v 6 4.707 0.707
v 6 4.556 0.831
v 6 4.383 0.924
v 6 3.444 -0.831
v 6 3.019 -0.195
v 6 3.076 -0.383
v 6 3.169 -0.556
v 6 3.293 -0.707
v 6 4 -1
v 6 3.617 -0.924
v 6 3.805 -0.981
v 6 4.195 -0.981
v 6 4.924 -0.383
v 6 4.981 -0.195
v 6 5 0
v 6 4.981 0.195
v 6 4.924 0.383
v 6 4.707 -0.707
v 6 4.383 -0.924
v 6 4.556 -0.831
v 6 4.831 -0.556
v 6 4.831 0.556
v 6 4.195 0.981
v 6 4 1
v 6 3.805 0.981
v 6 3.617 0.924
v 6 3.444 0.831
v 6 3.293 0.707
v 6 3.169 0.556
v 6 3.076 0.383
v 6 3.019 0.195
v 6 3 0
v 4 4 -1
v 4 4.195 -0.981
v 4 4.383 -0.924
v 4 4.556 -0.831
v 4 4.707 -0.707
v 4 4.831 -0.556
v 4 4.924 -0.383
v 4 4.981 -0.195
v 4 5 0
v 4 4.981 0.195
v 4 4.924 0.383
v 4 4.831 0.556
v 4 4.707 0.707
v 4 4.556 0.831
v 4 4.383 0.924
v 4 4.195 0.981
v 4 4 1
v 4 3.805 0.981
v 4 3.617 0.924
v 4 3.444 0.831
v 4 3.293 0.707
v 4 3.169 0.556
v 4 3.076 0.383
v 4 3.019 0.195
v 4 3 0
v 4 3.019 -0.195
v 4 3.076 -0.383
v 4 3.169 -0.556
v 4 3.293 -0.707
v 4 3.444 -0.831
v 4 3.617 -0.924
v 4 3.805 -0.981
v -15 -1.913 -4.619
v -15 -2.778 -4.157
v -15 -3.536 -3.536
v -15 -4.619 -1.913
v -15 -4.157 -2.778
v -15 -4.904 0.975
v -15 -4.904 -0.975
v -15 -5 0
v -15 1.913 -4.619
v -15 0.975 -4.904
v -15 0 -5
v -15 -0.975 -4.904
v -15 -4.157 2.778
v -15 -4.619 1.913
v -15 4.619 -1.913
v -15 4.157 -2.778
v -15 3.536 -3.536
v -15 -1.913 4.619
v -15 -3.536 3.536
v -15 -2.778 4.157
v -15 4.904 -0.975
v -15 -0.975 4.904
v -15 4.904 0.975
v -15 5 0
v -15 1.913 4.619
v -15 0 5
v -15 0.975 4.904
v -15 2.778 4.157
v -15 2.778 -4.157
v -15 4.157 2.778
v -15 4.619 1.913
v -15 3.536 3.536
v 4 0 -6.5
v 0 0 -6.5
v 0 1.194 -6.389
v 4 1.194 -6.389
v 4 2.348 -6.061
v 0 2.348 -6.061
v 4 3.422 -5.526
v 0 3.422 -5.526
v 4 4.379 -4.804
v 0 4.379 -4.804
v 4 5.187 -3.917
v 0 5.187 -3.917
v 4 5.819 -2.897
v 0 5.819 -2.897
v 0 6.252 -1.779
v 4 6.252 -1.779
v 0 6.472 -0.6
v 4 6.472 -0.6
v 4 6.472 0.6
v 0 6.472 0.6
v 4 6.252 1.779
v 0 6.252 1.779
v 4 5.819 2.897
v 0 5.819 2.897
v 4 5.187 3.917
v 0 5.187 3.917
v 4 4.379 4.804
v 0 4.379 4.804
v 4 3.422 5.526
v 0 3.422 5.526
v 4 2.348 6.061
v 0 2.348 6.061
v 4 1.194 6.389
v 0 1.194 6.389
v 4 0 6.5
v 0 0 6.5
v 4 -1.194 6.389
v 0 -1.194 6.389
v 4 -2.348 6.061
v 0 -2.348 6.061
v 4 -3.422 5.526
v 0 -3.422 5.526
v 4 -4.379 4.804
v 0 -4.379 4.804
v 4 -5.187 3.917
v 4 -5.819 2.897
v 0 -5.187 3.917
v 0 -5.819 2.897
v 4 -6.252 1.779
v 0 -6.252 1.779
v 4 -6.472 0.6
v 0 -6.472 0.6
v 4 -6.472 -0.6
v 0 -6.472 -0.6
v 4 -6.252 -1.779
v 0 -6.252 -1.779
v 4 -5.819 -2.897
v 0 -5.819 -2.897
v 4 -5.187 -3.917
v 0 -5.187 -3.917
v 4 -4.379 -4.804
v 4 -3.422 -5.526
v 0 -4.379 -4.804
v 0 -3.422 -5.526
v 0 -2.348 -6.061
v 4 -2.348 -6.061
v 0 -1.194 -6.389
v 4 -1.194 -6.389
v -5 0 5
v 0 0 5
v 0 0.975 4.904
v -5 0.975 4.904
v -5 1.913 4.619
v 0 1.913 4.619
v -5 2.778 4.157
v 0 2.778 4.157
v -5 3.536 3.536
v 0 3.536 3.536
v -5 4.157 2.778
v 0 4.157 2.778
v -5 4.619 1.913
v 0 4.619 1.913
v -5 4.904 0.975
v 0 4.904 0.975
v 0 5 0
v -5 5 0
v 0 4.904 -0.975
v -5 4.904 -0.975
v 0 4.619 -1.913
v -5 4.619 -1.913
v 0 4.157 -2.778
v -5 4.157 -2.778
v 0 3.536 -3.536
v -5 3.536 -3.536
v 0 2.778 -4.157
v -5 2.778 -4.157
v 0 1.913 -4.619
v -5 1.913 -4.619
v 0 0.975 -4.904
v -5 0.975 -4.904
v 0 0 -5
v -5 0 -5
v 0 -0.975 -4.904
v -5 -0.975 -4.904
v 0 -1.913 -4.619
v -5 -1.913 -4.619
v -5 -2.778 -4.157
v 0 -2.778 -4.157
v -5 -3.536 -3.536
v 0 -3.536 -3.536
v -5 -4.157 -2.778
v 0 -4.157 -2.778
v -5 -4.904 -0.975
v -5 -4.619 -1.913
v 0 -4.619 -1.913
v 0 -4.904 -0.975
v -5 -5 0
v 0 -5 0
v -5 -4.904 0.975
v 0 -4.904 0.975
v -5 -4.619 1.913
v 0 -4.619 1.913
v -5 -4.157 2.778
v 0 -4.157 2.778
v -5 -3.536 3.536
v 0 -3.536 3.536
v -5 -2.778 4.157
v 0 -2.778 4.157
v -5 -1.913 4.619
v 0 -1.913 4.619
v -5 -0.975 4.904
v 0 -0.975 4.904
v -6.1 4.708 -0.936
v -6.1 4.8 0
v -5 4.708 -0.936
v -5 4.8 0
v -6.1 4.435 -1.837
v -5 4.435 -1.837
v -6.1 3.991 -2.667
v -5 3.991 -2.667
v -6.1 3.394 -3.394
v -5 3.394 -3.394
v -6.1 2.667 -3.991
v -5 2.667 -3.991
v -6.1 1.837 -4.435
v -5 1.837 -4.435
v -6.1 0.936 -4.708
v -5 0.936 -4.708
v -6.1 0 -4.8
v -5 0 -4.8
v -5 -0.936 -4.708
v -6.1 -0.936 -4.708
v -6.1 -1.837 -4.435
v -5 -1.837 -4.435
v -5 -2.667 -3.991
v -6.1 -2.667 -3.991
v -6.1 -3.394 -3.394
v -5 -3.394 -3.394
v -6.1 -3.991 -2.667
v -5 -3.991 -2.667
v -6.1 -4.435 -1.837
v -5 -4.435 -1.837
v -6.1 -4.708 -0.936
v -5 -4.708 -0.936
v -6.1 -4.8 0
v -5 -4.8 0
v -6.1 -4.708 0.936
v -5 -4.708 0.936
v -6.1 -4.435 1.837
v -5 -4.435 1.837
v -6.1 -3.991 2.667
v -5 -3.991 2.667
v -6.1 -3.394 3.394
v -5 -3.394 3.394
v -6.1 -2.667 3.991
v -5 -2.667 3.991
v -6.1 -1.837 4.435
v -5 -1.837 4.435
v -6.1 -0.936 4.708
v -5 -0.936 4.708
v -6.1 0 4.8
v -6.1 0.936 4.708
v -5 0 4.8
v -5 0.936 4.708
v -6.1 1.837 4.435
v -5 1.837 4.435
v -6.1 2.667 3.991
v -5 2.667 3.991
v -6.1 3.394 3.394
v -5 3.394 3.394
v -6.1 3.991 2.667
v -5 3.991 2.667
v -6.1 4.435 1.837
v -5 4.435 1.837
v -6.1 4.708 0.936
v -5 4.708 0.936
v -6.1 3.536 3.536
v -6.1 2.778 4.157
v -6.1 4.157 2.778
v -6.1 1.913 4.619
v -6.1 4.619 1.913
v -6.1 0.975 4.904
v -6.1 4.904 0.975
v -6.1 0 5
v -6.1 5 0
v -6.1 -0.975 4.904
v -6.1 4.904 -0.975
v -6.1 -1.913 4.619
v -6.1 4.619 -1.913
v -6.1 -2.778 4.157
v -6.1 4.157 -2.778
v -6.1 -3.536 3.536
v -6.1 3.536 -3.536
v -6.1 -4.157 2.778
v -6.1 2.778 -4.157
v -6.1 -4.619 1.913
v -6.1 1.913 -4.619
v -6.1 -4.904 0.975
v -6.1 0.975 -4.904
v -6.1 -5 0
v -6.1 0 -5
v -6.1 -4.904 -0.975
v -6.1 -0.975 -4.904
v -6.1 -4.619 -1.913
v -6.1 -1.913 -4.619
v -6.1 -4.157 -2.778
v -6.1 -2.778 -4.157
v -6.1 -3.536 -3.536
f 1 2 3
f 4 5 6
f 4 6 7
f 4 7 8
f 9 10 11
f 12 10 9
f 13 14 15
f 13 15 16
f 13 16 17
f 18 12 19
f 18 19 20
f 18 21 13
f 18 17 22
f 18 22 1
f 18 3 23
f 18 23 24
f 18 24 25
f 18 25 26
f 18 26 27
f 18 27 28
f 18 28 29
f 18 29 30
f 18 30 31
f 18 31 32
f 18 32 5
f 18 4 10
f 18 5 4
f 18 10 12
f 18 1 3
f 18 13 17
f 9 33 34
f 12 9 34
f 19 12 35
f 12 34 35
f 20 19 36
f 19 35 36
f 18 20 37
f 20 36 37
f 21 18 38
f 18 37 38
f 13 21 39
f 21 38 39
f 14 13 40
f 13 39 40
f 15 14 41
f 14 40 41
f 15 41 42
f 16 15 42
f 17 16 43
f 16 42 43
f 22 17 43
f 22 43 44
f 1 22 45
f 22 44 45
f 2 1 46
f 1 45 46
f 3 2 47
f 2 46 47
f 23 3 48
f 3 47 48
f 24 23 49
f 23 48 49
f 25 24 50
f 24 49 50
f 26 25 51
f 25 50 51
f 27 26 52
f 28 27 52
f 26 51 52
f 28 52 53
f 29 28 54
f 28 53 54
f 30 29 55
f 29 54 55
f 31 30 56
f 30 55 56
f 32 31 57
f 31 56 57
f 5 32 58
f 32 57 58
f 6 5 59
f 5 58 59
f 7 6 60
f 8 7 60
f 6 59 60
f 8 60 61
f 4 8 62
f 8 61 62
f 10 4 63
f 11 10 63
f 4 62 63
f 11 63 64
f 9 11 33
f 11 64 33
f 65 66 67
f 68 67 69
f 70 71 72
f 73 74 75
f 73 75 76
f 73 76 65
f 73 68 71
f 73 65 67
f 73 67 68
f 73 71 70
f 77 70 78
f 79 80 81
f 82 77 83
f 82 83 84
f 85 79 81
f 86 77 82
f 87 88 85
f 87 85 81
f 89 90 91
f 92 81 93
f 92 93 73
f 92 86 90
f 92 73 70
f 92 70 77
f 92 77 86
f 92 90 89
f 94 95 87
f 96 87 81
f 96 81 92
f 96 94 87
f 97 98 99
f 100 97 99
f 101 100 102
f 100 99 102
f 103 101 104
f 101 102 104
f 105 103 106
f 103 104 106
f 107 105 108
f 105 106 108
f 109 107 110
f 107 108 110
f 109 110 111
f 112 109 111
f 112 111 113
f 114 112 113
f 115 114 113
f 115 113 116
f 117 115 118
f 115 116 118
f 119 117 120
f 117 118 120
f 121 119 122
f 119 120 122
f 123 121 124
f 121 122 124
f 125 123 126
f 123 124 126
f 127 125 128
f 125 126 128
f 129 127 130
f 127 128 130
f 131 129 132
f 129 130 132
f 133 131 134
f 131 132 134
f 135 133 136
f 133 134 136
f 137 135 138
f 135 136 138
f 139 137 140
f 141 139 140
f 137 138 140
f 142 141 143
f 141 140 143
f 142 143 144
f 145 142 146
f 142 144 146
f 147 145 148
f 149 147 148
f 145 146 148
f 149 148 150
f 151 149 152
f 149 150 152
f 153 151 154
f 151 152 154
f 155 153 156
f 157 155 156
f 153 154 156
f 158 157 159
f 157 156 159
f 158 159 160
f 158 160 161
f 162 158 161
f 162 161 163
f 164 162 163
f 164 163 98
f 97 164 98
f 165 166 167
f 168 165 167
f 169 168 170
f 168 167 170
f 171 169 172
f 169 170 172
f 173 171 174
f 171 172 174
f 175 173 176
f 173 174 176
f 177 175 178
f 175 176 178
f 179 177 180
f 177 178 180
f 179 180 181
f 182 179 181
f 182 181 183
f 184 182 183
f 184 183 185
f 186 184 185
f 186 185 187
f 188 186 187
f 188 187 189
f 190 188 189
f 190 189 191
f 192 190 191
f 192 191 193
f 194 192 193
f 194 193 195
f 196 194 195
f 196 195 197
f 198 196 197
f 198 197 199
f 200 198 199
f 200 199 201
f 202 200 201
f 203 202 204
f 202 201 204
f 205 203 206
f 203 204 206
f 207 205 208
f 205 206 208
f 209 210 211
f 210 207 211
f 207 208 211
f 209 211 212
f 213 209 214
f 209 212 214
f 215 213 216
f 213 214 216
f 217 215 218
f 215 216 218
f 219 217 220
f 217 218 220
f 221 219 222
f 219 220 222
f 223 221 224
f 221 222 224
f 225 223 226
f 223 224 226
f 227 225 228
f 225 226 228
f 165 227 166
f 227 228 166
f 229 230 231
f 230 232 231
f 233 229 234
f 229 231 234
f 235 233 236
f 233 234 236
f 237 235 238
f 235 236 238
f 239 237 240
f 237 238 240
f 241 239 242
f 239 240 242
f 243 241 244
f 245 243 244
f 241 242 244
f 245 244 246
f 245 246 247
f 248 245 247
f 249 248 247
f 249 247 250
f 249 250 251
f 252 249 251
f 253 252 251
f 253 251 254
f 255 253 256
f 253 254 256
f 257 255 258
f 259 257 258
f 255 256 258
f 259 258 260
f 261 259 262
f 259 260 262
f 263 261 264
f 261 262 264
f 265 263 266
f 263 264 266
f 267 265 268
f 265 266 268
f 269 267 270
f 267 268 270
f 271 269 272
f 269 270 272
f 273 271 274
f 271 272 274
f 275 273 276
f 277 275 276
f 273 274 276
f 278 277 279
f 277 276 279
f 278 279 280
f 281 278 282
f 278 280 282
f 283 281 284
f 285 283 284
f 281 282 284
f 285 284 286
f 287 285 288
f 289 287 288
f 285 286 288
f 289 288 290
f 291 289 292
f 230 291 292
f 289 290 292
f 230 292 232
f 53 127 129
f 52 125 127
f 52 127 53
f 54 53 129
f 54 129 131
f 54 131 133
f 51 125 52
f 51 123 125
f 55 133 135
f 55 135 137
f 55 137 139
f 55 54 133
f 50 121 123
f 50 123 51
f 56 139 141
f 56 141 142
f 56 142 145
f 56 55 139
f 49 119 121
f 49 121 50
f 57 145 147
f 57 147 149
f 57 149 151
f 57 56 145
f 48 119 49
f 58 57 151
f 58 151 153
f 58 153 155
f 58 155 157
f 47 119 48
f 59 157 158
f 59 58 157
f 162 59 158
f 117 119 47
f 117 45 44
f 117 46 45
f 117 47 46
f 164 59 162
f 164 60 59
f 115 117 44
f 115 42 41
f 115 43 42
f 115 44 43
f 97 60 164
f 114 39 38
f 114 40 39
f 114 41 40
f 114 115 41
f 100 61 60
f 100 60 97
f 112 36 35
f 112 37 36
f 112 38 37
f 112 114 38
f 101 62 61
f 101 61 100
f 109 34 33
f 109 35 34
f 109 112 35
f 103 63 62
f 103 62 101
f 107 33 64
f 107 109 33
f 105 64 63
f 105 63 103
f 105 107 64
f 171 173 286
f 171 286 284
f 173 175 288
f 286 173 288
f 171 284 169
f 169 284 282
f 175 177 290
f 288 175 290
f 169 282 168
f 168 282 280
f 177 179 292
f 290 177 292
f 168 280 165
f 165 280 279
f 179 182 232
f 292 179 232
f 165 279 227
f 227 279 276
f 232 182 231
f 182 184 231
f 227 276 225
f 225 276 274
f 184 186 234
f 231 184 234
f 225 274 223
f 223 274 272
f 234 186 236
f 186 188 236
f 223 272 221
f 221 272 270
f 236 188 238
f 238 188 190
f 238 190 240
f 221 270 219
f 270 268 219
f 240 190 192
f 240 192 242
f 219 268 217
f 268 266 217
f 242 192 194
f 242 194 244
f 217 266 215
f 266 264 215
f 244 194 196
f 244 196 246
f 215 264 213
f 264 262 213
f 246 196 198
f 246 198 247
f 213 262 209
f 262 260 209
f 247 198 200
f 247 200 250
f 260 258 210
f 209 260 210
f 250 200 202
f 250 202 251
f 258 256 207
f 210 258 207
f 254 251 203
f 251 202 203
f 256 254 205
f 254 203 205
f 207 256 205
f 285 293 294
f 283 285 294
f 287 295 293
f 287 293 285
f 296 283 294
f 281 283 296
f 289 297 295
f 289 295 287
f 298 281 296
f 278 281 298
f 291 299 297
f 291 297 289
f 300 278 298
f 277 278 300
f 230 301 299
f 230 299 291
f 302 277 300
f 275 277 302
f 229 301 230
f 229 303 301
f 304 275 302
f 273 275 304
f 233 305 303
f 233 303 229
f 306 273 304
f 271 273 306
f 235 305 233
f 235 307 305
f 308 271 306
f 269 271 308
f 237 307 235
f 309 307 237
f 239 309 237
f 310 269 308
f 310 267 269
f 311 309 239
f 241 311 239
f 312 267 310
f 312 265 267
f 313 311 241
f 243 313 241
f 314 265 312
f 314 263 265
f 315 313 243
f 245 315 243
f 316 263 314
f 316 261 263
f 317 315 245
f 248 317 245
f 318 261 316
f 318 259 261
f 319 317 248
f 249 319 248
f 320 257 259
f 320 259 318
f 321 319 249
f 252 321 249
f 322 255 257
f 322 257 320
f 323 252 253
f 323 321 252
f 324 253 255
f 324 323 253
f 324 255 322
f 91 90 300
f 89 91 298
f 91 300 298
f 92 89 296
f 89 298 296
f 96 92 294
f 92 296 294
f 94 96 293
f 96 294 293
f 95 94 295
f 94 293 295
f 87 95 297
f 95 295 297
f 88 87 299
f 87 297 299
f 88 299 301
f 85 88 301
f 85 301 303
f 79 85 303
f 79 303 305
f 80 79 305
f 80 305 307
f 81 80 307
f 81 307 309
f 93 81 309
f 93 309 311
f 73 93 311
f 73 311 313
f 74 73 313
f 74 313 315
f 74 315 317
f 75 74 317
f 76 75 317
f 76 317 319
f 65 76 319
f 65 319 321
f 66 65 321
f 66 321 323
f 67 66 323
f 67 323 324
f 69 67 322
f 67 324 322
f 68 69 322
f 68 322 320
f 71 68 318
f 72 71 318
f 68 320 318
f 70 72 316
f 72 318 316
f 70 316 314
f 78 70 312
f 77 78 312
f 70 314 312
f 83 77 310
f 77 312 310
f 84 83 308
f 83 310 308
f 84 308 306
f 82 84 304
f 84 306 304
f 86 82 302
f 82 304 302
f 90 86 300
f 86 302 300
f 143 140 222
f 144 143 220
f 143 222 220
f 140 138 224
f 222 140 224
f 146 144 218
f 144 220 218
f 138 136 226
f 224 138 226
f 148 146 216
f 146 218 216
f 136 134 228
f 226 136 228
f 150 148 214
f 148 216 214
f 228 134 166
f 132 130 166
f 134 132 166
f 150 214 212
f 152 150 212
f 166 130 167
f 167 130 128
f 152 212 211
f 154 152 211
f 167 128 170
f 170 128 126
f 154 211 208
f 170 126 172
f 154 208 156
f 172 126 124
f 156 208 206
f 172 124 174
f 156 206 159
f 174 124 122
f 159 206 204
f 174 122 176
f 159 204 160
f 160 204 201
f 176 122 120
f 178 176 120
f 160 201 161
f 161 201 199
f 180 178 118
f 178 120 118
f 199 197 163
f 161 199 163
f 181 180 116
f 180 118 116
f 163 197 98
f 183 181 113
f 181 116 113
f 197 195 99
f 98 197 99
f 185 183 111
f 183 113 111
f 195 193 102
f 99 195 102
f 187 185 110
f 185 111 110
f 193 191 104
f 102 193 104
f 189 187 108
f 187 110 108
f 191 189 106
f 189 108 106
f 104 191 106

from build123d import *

# Parameters (mm, degrees)
SKETCH1_R           = 6.5
BOSS_EXTRUDE1_DEPTH = 4
SKETCH2_R           = 5
BOSS_EXTRUDE2_DEPTH = 15
SKETCH3_R           = 1
BOSS_EXTRUDE3_DEPTH = 2
SKETCH4_W           = 1.1
SKETCH4_H           = 0.2


with BuildPart() as part:
    # Sketch1 → Boss-Extrude1 (new body)
    with BuildSketch(Plane(origin=(0, 0, 0), x_dir=(0, 0, -1), z_dir=(1, 0, 0))):
        Circle(SKETCH1_R)
    extrude(amount=BOSS_EXTRUDE1_DEPTH)

    # Sketch2 → Boss-Extrude2 (add)
    with BuildSketch(Plane.ZY):
        Circle(SKETCH2_R)
    extrude(amount=BOSS_EXTRUDE2_DEPTH)

    # Sketch3 → Boss-Extrude3 (add)
    with BuildSketch(Plane(origin=(4, 0, 0), x_dir=(0, 0, -1), z_dir=(1, 0, 0))):
        with Locations((0, 4)):
            Circle(SKETCH3_R)
    extrude(amount=BOSS_EXTRUDE3_DEPTH)

    # Sketch4 → Cut-Revolve1 (revolve, cut)
    with BuildSketch(Plane.XY):
        with Locations((-5.55, 4.9)):
            Rectangle(SKETCH4_W, SKETCH4_H)
    revolve(axis=Axis((-1.178470482, 0, 0), (-1, 0, 0)), mode=Mode.SUBTRACT)


solid = part.part
